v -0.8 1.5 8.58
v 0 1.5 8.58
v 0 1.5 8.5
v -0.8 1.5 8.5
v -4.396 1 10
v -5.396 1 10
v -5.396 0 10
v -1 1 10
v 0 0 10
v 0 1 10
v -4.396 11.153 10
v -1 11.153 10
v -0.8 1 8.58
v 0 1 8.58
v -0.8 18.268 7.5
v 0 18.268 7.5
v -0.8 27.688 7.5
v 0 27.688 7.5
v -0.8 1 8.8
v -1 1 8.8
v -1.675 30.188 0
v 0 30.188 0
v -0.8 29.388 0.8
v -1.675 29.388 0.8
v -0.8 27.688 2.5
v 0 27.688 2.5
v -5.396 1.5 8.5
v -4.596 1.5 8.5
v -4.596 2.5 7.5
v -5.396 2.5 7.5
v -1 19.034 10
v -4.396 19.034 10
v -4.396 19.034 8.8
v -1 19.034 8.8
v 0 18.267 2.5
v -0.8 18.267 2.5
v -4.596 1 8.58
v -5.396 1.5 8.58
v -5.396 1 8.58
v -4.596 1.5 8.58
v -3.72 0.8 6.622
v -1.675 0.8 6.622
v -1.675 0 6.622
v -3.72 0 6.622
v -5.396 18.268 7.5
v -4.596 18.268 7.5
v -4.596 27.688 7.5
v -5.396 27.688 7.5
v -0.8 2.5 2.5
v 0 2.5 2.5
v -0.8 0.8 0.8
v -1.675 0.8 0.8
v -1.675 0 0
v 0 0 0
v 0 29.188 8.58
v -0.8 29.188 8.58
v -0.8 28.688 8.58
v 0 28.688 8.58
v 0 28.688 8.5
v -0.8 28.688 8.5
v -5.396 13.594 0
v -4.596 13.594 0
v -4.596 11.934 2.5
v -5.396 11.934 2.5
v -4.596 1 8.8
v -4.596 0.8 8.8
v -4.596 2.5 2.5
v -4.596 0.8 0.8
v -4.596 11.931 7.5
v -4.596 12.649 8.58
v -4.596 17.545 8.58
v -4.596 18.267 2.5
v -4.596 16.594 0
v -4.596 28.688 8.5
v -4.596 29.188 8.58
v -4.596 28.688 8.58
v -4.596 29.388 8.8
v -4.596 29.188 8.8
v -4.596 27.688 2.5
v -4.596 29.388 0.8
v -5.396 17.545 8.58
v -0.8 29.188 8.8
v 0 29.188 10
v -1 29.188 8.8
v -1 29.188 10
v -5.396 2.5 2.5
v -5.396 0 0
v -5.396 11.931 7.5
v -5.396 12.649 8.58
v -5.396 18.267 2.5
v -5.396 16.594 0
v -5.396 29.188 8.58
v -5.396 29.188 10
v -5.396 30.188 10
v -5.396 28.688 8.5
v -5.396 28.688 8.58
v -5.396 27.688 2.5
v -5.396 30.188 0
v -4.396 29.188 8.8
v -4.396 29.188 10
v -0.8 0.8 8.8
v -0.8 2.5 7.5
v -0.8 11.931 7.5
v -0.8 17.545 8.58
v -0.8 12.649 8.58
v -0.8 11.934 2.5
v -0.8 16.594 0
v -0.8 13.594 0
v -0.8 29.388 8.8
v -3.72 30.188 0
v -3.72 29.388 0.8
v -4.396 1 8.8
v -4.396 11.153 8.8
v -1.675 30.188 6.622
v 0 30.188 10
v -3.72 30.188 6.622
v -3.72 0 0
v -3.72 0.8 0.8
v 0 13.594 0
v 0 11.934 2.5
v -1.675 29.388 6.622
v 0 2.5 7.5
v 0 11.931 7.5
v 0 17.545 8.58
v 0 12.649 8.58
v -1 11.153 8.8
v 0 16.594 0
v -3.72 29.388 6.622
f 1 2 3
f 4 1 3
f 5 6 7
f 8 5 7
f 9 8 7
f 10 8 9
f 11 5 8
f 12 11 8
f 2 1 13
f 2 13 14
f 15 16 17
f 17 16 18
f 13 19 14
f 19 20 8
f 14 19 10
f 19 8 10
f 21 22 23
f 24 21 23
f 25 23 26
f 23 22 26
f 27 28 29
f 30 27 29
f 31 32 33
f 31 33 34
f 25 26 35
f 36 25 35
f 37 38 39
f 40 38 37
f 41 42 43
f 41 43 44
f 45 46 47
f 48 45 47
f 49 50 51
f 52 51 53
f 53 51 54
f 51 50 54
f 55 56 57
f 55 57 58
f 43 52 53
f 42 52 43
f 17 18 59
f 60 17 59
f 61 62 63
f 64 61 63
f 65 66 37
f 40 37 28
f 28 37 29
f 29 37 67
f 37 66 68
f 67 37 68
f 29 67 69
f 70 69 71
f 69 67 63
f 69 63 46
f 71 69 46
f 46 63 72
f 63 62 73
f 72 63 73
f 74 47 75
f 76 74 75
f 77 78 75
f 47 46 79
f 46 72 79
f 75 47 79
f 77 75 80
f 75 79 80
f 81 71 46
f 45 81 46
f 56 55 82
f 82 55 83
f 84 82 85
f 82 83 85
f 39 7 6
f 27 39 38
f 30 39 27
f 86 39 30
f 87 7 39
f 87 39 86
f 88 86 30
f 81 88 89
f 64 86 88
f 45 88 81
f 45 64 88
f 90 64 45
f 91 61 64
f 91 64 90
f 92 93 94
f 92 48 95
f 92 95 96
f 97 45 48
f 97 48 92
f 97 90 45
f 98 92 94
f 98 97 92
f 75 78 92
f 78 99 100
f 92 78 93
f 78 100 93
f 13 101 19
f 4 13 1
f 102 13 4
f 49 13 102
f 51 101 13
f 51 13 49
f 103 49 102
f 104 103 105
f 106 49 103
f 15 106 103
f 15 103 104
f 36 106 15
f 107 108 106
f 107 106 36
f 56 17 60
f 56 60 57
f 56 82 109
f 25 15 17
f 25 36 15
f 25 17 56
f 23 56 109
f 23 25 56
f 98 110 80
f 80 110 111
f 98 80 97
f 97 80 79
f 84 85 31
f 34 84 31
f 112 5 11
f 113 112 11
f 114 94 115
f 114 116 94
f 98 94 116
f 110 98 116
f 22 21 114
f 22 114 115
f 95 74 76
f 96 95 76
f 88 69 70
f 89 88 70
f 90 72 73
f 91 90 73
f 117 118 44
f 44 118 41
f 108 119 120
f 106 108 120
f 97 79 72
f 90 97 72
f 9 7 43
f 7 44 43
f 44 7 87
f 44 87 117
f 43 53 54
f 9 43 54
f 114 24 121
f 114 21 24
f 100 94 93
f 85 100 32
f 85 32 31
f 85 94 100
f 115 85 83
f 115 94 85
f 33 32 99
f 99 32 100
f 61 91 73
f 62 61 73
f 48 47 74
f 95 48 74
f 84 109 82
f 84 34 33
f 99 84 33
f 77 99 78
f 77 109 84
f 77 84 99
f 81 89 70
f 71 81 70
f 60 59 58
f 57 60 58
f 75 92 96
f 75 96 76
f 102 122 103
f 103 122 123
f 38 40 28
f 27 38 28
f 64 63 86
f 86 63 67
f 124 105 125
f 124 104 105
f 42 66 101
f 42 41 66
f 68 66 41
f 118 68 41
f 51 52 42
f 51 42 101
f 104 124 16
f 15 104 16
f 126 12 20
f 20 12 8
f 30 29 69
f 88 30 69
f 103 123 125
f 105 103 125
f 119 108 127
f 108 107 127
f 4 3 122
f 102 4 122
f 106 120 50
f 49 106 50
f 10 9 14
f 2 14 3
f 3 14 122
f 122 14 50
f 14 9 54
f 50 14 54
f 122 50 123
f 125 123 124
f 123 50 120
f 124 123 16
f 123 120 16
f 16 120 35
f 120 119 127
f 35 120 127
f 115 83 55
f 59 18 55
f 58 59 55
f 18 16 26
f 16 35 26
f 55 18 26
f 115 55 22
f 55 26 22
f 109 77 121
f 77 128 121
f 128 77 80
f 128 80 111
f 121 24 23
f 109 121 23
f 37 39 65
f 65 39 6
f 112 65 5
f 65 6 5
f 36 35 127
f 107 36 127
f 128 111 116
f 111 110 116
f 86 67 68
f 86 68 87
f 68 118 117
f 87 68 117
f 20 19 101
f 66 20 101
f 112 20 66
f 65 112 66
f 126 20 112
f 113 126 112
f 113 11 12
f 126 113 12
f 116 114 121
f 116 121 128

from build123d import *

# Parameters (mm, degrees)
F0_W      = 5.3958347999
F0_H      = 30.1875006407
F0_W_2    = 3.7958348403
F0_H_2    = 28.5875006812
F1_DEPTH  = 10
F4_DEPTH  = 6.7
F3_W      = 2.0448579453
F3_H      = 6.6219959408
F5_DEPTH  = 31.8
F6_DEPTH  = 6.5
F3_W_2    = 5.3958347999
F3_H_2    = 1.2
F7_DEPTH  = 6.9
F8_DEPTH  = 30.1
F10_DEPTH = 1.42
F9_W      = 3.3958347049
F9_H      = 3.9405850694
F11_DEPTH = 1.3


with BuildPart() as f1:
    # F0 (on Top) → F1 (new body)
    with BuildSketch(Plane.XY):
        with Locations((-2.6979173999, 15.0937503204)):
            Rectangle(F0_W, F0_H)
        with Locations((-2.6979173999, 15.0937503204)):
            Rectangle(F0_W_2, F0_H_2, mode=Mode.SUBTRACT)
    extrude(amount=F1_DEPTH)

    # F2 (on face) → F4 (cut)
    with BuildSketch(Plane.YZ):
        Polygon((28.6875006277, 1.500000013), (27.6875006966, 2.4999999441), (18.2672608644, 2.4999999441), (16.5937503204, 0), (30.1875006407, 0), align=None)
        Polygon((2.4999999441, 2.4999999441), (1.500000013, 1.500000013), (0, 0), (13.5937503204, 0), (11.9336228818, 2.4999999441), align=None)
    extrude(amount=-F4_DEPTH, mode=Mode.SUBTRACT)

    # F3 (on face) → F5 (cut)
    with BuildSketch(Plane(origin=(0, 30.1875006407, 0), x_dir=(-1, 0, 0), z_dir=(0, 1, 0))):
        with Locations((2.6979173999, 3.3109979704)):
            Rectangle(F3_W, F3_H)
    extrude(amount=-F5_DEPTH, mode=Mode.SUBTRACT)

    # F2 (on face) → F6 (cut)
    with BuildSketch(Plane.YZ):
        Polygon((18.2681400329, 7.5000000559), (27.6875006966, 7.5000000559), (28.6875006277, 8.499999987), (28.6875006277, 10), (16.5937503204, 10), align=None)
        Polygon((1.500000013, 10), (1.500000013, 8.499999987), (2.4999999441, 7.5000000559), (11.9306277484, 7.5000000559), (13.5937503204, 10), align=None)
    extrude(amount=-F6_DEPTH, mode=Mode.SUBTRACT)

    # F3 (on face) → F7 (join)
    with BuildSketch(Plane(origin=(0, 30.1875006407, 0), x_dir=(-1, 0, 0), z_dir=(0, 1, 0))):
        with Locations((2.6979173999, 9.4)):
            Rectangle(F3_W_2, F3_H_2)
    extrude(amount=-F7_DEPTH)

    # F3 (on face) → F8 (join)
    with BuildSketch(Plane(origin=(0, 30.1875006407, 0), x_dir=(-1, 0, 0), z_dir=(0, 1, 0))):
        with Locations((2.6979173999, 9.4)):
            Rectangle(F3_W_2, F3_H_2)
    extrude(amount=-F8_DEPTH)

    # F9 (on face) → F10 (cut)
    with BuildSketch(Plane.XY.offset(10)):
        Polygon((-5.3958347999, 1.0000000475), (-4.3958347524, 1.0000000475), (-4.3958347524, 11.153165251), (-4.3958347524, 15.0937503204), (-4.3958347524, 19.0343353897), (-4.3958347524, 29.1875005933), (-5.3958347999, 29.1875005933), align=None)
        Polygon((-1.0000000475, 11.153165251), (-1.0000000475, 1.0000000475), (0, 1.0000000475), (0, 29.1875005933), (-1.0000000475, 29.1875005933), (-1.0000000475, 19.0343353897), (-1.0000000475, 15.0937503204), align=None)
    extrude(amount=-F10_DEPTH, mode=Mode.SUBTRACT)

    # F9 (on face) → F11 (cut)
    with BuildSketch(Plane.XY.offset(10)):
        with Locations((-2.6979173999, 13.1234577857)):
            Rectangle(F9_W, F9_H)
        with Locations((-2.6979173999, 17.0640428551)):
            Rectangle(F9_W, F9_H)
    extrude(amount=-F11_DEPTH, mode=Mode.SUBTRACT)


solid = f1.part
